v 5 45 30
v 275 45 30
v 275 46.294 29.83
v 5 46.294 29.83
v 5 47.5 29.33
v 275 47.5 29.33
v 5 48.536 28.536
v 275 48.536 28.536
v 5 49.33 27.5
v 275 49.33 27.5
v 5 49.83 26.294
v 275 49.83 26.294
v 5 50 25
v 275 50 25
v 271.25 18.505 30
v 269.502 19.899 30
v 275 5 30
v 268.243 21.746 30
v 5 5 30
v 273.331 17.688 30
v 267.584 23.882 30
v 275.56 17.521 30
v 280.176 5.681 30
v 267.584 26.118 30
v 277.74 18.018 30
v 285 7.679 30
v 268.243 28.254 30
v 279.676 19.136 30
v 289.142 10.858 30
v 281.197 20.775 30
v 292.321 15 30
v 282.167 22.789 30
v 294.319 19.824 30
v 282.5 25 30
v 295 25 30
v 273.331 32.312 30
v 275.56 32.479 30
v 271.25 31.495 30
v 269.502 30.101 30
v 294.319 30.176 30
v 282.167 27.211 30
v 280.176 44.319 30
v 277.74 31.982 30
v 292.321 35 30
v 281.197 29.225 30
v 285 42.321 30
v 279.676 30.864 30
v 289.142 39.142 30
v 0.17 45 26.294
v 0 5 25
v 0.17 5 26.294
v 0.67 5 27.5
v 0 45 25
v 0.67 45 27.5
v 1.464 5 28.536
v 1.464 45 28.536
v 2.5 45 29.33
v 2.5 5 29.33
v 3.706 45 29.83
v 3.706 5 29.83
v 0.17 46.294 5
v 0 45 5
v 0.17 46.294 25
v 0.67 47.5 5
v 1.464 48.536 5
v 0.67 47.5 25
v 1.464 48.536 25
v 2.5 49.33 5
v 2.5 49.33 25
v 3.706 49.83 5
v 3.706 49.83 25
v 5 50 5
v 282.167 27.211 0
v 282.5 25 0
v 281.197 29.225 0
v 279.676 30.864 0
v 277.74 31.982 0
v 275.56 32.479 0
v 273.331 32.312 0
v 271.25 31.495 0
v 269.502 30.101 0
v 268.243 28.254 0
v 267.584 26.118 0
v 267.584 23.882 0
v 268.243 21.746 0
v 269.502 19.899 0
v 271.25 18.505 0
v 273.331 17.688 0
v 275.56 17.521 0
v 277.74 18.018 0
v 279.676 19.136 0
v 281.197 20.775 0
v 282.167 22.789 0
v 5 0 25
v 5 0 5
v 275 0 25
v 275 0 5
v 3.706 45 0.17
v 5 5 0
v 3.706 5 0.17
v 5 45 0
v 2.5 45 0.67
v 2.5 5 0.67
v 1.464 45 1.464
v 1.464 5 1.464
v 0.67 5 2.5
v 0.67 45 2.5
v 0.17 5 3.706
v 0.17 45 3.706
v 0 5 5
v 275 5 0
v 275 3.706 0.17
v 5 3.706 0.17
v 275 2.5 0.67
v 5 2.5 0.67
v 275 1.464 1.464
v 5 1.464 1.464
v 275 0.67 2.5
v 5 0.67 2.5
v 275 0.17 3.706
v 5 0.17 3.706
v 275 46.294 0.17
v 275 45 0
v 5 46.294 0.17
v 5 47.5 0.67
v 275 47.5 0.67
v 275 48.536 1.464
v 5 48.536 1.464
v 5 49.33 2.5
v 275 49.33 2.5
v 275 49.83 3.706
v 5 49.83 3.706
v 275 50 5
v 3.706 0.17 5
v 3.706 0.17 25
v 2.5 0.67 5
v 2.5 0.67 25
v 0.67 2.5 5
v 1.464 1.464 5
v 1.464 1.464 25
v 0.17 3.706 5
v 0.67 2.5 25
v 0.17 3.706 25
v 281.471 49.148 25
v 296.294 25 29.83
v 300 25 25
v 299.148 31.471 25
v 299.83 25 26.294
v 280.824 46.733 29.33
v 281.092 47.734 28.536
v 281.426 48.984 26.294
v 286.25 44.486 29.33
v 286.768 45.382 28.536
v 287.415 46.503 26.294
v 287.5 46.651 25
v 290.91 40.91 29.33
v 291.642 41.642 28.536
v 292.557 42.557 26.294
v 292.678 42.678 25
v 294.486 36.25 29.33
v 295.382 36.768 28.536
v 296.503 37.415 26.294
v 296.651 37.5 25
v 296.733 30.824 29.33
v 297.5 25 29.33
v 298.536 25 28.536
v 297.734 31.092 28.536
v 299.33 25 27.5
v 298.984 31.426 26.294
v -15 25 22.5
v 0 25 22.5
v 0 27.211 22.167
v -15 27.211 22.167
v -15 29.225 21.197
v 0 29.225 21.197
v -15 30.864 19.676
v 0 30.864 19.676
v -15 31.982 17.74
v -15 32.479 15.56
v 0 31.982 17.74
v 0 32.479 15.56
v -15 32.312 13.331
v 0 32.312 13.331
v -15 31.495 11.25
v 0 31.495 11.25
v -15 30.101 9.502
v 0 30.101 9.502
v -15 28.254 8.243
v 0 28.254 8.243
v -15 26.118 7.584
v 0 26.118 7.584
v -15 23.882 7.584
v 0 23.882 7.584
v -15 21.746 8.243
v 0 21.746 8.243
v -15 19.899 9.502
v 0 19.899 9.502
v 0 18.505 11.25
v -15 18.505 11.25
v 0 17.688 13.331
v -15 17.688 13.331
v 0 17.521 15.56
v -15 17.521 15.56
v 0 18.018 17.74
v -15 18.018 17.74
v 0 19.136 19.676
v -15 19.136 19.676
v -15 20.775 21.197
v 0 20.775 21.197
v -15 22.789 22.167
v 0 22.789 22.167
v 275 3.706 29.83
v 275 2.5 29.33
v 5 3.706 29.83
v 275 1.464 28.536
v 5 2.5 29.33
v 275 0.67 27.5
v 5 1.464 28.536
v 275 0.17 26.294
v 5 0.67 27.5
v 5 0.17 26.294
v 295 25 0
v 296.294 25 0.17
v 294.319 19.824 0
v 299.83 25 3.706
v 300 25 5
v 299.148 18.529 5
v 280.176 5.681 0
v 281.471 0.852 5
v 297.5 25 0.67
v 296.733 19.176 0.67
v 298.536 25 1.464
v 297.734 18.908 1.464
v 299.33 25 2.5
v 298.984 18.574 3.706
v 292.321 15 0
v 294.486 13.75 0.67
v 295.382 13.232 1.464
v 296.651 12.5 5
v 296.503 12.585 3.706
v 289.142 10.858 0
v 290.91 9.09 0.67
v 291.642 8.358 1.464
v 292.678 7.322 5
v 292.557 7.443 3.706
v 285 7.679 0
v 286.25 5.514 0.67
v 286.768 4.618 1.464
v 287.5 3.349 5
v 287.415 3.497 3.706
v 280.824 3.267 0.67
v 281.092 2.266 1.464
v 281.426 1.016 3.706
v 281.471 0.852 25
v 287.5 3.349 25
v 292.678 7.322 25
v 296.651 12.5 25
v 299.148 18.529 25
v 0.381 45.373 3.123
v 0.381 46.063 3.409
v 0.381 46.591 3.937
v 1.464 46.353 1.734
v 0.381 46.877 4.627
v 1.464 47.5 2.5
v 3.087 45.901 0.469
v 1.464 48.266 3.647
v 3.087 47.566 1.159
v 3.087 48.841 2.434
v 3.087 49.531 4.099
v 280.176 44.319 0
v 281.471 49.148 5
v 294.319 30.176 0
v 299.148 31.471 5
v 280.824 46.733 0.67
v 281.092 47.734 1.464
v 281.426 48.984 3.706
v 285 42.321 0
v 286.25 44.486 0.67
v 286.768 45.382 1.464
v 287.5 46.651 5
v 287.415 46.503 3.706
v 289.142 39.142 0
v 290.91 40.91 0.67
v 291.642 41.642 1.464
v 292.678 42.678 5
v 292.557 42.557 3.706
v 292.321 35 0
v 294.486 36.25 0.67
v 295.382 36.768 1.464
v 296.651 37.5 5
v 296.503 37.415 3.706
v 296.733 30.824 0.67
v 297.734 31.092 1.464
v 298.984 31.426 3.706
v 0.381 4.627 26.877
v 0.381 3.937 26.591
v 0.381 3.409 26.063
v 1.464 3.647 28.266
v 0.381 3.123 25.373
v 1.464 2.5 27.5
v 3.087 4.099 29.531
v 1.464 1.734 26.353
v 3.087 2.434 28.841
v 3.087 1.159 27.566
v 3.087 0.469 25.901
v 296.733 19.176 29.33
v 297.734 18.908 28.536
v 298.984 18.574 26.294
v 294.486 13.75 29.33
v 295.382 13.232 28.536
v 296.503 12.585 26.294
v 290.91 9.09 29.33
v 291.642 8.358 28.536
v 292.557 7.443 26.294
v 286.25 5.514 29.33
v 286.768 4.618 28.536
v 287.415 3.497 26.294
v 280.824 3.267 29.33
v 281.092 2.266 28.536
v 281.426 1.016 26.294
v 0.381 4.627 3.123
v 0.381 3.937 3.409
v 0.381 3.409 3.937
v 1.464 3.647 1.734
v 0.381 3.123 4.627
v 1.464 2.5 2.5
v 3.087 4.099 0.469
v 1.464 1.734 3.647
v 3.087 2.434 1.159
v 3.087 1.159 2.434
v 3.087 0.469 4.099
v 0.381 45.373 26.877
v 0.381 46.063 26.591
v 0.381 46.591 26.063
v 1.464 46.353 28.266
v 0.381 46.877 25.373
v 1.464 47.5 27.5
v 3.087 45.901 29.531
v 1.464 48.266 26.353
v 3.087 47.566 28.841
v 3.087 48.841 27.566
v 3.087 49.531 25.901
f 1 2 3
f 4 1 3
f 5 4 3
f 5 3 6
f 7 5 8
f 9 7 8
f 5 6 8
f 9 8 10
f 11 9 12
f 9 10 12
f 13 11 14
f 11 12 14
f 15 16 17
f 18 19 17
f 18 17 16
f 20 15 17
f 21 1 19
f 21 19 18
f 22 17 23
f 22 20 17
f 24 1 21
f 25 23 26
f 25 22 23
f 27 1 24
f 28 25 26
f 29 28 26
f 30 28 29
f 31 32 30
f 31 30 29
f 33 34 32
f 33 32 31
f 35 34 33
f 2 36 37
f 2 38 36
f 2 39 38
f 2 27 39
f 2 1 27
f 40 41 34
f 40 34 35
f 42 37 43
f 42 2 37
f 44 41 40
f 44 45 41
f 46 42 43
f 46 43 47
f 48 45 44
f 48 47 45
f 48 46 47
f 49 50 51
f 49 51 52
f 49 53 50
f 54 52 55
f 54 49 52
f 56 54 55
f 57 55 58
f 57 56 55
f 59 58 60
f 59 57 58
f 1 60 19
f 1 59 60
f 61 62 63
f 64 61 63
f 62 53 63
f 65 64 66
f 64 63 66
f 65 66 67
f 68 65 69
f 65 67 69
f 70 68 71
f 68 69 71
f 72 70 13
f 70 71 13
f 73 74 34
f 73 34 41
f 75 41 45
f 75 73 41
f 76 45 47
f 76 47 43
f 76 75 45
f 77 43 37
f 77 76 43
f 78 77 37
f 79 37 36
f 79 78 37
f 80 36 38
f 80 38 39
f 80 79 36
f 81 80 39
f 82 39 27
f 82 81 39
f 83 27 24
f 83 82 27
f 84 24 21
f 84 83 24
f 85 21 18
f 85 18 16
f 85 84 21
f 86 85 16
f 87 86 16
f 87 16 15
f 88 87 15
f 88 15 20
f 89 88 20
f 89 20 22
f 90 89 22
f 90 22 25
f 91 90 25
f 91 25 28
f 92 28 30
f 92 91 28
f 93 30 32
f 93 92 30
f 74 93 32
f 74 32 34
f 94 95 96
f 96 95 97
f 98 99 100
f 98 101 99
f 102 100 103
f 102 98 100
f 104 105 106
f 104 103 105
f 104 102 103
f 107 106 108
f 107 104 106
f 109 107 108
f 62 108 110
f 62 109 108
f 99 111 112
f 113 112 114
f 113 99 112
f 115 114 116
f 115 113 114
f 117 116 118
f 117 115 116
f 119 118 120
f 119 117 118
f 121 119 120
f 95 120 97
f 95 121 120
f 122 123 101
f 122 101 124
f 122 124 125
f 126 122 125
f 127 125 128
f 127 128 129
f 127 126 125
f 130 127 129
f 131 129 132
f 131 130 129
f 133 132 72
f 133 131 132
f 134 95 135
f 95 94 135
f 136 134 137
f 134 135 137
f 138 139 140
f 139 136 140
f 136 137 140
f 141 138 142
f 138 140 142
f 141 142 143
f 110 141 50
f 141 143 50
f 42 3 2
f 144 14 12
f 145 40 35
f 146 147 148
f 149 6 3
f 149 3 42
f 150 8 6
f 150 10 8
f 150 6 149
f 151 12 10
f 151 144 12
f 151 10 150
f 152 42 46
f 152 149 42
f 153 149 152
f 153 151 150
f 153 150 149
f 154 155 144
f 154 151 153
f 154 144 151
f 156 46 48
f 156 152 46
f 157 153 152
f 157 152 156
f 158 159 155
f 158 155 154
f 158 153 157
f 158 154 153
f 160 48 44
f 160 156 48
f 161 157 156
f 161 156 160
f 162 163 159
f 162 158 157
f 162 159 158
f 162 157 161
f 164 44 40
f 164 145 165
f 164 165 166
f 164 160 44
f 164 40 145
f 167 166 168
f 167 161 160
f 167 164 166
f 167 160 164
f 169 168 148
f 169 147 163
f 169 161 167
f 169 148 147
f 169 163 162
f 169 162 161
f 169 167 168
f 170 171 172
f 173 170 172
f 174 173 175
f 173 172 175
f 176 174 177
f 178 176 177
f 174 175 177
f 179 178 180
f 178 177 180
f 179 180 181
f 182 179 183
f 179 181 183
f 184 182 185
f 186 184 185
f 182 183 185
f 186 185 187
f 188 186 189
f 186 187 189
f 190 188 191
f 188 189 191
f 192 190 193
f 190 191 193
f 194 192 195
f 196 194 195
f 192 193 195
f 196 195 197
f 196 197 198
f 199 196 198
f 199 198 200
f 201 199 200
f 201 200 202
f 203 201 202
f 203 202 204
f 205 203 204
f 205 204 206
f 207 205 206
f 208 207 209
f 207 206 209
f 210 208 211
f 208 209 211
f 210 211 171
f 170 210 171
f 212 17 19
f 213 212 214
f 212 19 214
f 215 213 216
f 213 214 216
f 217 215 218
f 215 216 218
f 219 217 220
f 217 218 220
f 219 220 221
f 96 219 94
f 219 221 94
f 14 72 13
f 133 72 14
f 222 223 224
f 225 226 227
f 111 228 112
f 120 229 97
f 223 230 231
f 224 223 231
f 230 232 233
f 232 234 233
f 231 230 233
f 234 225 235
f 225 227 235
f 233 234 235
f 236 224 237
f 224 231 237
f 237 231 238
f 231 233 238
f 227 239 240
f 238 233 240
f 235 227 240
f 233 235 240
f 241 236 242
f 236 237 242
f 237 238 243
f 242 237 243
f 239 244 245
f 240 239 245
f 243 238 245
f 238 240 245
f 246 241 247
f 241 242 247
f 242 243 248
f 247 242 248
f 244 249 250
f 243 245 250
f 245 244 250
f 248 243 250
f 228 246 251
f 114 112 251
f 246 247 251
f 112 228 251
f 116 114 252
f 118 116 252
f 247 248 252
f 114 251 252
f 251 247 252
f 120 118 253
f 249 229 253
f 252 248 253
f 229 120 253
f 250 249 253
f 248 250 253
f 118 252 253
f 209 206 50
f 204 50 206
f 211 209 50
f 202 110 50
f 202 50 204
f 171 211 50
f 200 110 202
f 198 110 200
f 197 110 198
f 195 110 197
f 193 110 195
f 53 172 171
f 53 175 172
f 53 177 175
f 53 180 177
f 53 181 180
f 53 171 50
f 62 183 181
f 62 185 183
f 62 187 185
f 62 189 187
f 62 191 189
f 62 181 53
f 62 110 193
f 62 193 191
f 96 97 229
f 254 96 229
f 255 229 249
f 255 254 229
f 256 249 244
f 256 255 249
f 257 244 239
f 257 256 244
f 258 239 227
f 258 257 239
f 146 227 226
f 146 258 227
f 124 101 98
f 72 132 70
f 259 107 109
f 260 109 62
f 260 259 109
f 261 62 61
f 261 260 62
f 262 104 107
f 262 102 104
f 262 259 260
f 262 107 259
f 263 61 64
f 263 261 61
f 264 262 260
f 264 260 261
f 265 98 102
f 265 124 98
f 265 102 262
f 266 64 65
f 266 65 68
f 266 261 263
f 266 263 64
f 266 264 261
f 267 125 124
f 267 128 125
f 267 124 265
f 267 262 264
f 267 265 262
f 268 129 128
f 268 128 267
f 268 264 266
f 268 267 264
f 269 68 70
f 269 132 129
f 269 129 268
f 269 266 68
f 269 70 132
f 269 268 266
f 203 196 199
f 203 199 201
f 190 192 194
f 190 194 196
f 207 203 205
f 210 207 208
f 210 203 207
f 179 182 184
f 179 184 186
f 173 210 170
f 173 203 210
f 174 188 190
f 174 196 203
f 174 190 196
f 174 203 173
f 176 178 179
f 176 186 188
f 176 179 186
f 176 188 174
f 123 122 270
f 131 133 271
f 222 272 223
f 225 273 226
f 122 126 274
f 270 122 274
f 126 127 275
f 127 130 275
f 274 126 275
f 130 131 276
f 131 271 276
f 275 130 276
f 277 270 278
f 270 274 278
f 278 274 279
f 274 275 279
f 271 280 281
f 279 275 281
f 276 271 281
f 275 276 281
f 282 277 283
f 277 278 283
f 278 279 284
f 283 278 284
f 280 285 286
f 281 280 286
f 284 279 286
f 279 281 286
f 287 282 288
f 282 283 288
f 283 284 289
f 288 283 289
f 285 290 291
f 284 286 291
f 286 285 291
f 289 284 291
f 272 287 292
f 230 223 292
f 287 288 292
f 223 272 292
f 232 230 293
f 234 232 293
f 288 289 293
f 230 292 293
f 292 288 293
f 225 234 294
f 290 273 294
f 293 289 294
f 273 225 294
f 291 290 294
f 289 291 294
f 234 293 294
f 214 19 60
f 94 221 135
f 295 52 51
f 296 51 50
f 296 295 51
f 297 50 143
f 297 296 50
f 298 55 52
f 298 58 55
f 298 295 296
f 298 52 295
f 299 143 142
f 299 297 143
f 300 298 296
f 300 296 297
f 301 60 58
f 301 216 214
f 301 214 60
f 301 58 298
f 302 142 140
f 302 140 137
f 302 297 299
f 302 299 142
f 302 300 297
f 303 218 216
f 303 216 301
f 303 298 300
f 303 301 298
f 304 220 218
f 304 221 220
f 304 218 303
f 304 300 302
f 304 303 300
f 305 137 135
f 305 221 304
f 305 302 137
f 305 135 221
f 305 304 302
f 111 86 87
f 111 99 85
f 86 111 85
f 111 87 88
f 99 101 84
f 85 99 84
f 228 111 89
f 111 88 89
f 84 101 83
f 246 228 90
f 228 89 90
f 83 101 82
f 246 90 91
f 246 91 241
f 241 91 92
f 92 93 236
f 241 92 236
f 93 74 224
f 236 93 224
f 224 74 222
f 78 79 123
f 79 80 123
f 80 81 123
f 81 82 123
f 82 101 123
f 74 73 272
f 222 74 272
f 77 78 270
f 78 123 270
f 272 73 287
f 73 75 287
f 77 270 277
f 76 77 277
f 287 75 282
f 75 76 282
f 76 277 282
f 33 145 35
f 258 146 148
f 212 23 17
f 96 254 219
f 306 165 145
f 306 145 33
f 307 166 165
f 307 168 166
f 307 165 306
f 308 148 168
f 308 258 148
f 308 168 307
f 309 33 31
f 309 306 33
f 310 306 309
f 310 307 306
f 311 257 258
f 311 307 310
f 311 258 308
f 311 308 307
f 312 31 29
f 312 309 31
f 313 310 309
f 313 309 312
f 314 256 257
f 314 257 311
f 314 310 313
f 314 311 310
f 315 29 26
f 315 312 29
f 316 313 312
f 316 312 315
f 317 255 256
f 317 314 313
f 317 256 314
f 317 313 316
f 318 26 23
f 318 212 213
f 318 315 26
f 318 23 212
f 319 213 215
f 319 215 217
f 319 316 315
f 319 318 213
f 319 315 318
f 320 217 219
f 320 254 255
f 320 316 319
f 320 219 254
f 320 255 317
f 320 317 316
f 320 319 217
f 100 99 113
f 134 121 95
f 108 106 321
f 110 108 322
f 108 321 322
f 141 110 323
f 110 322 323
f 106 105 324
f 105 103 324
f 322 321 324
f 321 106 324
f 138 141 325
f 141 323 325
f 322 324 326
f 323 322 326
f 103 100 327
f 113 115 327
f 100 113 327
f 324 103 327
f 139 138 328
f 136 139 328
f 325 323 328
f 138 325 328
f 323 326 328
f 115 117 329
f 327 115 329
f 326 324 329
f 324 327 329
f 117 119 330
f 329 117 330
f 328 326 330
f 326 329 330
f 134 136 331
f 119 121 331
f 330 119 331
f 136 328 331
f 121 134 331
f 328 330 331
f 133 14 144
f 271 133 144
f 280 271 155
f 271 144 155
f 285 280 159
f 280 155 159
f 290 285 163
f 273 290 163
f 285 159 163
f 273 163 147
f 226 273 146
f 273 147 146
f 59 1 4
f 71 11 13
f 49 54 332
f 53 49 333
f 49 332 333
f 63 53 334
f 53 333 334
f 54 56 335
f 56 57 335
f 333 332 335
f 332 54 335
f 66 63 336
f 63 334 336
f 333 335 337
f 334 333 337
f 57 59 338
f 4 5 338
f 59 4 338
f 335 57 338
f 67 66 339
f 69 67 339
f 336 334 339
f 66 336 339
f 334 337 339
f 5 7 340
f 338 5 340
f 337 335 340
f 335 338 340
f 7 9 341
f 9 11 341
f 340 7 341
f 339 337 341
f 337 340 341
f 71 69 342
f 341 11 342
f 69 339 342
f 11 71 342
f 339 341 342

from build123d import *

# Parameters (mm, degrees)
CROQUIS1_W              = 300
CROQUIS1_H              = 50
CROQUIS1_R              = 7.5
SALIENTE_EXTRUIR1_DEPTH = 30
REDONDEO1_R             = 25
CROQUIS2_R              = 7.5
SALIENTE_EXTRUIR2_DEPTH = 15
REDONDEO2_R             = 5


with BuildPart() as part:
    # Croquis1 → Saliente-Extruir1 (new body)
    with BuildSketch(Plane.XY):
        with Locations((150, 25)):
            Rectangle(CROQUIS1_W, CROQUIS1_H)
        with Locations((275, 25)):
            Circle(CROQUIS1_R, mode=Mode.SUBTRACT)
    extrude(amount=SALIENTE_EXTRUIR1_DEPTH)

    # Redondeo1
    redondeo1_edges = [part.edges().sort_by_distance(p)[0] for p in [
        (300, 0, 15),
        (300, 50, 15),
    ]]
    fillet(redondeo1_edges, radius=REDONDEO1_R - 0.0001)  # a hair under: the kernel refuses the full size

    # Croquis2 → Saliente-Extruir2 (add)
    with BuildSketch(Plane.ZY):
        with Locations((15, 25)):
            Circle(CROQUIS2_R)
    extrude(amount=SALIENTE_EXTRUIR2_DEPTH)

    # Redondeo2
    redondeo2_edges = [part.edges().sort_by_distance(p)[0] for p in [
        (137.50005, 50, 0),
        (292.677698819, 42.677698819, 0),
        (292.677698819, 7.322301181, 0),
        (137.50005, 50, 30),
        (292.677698819, 42.677698819, 30),
        (292.677698819, 7.322301181, 30),
        (0, 25, 30),
        (137.50005, 0, 0),
        (0, 25, 0),
        (137.50005, 0, 30),
        (0, 50, 15),
        (0, 0, 15),
    ]]
    fillet(redondeo2_edges, radius=REDONDEO2_R)


solid = part.part
